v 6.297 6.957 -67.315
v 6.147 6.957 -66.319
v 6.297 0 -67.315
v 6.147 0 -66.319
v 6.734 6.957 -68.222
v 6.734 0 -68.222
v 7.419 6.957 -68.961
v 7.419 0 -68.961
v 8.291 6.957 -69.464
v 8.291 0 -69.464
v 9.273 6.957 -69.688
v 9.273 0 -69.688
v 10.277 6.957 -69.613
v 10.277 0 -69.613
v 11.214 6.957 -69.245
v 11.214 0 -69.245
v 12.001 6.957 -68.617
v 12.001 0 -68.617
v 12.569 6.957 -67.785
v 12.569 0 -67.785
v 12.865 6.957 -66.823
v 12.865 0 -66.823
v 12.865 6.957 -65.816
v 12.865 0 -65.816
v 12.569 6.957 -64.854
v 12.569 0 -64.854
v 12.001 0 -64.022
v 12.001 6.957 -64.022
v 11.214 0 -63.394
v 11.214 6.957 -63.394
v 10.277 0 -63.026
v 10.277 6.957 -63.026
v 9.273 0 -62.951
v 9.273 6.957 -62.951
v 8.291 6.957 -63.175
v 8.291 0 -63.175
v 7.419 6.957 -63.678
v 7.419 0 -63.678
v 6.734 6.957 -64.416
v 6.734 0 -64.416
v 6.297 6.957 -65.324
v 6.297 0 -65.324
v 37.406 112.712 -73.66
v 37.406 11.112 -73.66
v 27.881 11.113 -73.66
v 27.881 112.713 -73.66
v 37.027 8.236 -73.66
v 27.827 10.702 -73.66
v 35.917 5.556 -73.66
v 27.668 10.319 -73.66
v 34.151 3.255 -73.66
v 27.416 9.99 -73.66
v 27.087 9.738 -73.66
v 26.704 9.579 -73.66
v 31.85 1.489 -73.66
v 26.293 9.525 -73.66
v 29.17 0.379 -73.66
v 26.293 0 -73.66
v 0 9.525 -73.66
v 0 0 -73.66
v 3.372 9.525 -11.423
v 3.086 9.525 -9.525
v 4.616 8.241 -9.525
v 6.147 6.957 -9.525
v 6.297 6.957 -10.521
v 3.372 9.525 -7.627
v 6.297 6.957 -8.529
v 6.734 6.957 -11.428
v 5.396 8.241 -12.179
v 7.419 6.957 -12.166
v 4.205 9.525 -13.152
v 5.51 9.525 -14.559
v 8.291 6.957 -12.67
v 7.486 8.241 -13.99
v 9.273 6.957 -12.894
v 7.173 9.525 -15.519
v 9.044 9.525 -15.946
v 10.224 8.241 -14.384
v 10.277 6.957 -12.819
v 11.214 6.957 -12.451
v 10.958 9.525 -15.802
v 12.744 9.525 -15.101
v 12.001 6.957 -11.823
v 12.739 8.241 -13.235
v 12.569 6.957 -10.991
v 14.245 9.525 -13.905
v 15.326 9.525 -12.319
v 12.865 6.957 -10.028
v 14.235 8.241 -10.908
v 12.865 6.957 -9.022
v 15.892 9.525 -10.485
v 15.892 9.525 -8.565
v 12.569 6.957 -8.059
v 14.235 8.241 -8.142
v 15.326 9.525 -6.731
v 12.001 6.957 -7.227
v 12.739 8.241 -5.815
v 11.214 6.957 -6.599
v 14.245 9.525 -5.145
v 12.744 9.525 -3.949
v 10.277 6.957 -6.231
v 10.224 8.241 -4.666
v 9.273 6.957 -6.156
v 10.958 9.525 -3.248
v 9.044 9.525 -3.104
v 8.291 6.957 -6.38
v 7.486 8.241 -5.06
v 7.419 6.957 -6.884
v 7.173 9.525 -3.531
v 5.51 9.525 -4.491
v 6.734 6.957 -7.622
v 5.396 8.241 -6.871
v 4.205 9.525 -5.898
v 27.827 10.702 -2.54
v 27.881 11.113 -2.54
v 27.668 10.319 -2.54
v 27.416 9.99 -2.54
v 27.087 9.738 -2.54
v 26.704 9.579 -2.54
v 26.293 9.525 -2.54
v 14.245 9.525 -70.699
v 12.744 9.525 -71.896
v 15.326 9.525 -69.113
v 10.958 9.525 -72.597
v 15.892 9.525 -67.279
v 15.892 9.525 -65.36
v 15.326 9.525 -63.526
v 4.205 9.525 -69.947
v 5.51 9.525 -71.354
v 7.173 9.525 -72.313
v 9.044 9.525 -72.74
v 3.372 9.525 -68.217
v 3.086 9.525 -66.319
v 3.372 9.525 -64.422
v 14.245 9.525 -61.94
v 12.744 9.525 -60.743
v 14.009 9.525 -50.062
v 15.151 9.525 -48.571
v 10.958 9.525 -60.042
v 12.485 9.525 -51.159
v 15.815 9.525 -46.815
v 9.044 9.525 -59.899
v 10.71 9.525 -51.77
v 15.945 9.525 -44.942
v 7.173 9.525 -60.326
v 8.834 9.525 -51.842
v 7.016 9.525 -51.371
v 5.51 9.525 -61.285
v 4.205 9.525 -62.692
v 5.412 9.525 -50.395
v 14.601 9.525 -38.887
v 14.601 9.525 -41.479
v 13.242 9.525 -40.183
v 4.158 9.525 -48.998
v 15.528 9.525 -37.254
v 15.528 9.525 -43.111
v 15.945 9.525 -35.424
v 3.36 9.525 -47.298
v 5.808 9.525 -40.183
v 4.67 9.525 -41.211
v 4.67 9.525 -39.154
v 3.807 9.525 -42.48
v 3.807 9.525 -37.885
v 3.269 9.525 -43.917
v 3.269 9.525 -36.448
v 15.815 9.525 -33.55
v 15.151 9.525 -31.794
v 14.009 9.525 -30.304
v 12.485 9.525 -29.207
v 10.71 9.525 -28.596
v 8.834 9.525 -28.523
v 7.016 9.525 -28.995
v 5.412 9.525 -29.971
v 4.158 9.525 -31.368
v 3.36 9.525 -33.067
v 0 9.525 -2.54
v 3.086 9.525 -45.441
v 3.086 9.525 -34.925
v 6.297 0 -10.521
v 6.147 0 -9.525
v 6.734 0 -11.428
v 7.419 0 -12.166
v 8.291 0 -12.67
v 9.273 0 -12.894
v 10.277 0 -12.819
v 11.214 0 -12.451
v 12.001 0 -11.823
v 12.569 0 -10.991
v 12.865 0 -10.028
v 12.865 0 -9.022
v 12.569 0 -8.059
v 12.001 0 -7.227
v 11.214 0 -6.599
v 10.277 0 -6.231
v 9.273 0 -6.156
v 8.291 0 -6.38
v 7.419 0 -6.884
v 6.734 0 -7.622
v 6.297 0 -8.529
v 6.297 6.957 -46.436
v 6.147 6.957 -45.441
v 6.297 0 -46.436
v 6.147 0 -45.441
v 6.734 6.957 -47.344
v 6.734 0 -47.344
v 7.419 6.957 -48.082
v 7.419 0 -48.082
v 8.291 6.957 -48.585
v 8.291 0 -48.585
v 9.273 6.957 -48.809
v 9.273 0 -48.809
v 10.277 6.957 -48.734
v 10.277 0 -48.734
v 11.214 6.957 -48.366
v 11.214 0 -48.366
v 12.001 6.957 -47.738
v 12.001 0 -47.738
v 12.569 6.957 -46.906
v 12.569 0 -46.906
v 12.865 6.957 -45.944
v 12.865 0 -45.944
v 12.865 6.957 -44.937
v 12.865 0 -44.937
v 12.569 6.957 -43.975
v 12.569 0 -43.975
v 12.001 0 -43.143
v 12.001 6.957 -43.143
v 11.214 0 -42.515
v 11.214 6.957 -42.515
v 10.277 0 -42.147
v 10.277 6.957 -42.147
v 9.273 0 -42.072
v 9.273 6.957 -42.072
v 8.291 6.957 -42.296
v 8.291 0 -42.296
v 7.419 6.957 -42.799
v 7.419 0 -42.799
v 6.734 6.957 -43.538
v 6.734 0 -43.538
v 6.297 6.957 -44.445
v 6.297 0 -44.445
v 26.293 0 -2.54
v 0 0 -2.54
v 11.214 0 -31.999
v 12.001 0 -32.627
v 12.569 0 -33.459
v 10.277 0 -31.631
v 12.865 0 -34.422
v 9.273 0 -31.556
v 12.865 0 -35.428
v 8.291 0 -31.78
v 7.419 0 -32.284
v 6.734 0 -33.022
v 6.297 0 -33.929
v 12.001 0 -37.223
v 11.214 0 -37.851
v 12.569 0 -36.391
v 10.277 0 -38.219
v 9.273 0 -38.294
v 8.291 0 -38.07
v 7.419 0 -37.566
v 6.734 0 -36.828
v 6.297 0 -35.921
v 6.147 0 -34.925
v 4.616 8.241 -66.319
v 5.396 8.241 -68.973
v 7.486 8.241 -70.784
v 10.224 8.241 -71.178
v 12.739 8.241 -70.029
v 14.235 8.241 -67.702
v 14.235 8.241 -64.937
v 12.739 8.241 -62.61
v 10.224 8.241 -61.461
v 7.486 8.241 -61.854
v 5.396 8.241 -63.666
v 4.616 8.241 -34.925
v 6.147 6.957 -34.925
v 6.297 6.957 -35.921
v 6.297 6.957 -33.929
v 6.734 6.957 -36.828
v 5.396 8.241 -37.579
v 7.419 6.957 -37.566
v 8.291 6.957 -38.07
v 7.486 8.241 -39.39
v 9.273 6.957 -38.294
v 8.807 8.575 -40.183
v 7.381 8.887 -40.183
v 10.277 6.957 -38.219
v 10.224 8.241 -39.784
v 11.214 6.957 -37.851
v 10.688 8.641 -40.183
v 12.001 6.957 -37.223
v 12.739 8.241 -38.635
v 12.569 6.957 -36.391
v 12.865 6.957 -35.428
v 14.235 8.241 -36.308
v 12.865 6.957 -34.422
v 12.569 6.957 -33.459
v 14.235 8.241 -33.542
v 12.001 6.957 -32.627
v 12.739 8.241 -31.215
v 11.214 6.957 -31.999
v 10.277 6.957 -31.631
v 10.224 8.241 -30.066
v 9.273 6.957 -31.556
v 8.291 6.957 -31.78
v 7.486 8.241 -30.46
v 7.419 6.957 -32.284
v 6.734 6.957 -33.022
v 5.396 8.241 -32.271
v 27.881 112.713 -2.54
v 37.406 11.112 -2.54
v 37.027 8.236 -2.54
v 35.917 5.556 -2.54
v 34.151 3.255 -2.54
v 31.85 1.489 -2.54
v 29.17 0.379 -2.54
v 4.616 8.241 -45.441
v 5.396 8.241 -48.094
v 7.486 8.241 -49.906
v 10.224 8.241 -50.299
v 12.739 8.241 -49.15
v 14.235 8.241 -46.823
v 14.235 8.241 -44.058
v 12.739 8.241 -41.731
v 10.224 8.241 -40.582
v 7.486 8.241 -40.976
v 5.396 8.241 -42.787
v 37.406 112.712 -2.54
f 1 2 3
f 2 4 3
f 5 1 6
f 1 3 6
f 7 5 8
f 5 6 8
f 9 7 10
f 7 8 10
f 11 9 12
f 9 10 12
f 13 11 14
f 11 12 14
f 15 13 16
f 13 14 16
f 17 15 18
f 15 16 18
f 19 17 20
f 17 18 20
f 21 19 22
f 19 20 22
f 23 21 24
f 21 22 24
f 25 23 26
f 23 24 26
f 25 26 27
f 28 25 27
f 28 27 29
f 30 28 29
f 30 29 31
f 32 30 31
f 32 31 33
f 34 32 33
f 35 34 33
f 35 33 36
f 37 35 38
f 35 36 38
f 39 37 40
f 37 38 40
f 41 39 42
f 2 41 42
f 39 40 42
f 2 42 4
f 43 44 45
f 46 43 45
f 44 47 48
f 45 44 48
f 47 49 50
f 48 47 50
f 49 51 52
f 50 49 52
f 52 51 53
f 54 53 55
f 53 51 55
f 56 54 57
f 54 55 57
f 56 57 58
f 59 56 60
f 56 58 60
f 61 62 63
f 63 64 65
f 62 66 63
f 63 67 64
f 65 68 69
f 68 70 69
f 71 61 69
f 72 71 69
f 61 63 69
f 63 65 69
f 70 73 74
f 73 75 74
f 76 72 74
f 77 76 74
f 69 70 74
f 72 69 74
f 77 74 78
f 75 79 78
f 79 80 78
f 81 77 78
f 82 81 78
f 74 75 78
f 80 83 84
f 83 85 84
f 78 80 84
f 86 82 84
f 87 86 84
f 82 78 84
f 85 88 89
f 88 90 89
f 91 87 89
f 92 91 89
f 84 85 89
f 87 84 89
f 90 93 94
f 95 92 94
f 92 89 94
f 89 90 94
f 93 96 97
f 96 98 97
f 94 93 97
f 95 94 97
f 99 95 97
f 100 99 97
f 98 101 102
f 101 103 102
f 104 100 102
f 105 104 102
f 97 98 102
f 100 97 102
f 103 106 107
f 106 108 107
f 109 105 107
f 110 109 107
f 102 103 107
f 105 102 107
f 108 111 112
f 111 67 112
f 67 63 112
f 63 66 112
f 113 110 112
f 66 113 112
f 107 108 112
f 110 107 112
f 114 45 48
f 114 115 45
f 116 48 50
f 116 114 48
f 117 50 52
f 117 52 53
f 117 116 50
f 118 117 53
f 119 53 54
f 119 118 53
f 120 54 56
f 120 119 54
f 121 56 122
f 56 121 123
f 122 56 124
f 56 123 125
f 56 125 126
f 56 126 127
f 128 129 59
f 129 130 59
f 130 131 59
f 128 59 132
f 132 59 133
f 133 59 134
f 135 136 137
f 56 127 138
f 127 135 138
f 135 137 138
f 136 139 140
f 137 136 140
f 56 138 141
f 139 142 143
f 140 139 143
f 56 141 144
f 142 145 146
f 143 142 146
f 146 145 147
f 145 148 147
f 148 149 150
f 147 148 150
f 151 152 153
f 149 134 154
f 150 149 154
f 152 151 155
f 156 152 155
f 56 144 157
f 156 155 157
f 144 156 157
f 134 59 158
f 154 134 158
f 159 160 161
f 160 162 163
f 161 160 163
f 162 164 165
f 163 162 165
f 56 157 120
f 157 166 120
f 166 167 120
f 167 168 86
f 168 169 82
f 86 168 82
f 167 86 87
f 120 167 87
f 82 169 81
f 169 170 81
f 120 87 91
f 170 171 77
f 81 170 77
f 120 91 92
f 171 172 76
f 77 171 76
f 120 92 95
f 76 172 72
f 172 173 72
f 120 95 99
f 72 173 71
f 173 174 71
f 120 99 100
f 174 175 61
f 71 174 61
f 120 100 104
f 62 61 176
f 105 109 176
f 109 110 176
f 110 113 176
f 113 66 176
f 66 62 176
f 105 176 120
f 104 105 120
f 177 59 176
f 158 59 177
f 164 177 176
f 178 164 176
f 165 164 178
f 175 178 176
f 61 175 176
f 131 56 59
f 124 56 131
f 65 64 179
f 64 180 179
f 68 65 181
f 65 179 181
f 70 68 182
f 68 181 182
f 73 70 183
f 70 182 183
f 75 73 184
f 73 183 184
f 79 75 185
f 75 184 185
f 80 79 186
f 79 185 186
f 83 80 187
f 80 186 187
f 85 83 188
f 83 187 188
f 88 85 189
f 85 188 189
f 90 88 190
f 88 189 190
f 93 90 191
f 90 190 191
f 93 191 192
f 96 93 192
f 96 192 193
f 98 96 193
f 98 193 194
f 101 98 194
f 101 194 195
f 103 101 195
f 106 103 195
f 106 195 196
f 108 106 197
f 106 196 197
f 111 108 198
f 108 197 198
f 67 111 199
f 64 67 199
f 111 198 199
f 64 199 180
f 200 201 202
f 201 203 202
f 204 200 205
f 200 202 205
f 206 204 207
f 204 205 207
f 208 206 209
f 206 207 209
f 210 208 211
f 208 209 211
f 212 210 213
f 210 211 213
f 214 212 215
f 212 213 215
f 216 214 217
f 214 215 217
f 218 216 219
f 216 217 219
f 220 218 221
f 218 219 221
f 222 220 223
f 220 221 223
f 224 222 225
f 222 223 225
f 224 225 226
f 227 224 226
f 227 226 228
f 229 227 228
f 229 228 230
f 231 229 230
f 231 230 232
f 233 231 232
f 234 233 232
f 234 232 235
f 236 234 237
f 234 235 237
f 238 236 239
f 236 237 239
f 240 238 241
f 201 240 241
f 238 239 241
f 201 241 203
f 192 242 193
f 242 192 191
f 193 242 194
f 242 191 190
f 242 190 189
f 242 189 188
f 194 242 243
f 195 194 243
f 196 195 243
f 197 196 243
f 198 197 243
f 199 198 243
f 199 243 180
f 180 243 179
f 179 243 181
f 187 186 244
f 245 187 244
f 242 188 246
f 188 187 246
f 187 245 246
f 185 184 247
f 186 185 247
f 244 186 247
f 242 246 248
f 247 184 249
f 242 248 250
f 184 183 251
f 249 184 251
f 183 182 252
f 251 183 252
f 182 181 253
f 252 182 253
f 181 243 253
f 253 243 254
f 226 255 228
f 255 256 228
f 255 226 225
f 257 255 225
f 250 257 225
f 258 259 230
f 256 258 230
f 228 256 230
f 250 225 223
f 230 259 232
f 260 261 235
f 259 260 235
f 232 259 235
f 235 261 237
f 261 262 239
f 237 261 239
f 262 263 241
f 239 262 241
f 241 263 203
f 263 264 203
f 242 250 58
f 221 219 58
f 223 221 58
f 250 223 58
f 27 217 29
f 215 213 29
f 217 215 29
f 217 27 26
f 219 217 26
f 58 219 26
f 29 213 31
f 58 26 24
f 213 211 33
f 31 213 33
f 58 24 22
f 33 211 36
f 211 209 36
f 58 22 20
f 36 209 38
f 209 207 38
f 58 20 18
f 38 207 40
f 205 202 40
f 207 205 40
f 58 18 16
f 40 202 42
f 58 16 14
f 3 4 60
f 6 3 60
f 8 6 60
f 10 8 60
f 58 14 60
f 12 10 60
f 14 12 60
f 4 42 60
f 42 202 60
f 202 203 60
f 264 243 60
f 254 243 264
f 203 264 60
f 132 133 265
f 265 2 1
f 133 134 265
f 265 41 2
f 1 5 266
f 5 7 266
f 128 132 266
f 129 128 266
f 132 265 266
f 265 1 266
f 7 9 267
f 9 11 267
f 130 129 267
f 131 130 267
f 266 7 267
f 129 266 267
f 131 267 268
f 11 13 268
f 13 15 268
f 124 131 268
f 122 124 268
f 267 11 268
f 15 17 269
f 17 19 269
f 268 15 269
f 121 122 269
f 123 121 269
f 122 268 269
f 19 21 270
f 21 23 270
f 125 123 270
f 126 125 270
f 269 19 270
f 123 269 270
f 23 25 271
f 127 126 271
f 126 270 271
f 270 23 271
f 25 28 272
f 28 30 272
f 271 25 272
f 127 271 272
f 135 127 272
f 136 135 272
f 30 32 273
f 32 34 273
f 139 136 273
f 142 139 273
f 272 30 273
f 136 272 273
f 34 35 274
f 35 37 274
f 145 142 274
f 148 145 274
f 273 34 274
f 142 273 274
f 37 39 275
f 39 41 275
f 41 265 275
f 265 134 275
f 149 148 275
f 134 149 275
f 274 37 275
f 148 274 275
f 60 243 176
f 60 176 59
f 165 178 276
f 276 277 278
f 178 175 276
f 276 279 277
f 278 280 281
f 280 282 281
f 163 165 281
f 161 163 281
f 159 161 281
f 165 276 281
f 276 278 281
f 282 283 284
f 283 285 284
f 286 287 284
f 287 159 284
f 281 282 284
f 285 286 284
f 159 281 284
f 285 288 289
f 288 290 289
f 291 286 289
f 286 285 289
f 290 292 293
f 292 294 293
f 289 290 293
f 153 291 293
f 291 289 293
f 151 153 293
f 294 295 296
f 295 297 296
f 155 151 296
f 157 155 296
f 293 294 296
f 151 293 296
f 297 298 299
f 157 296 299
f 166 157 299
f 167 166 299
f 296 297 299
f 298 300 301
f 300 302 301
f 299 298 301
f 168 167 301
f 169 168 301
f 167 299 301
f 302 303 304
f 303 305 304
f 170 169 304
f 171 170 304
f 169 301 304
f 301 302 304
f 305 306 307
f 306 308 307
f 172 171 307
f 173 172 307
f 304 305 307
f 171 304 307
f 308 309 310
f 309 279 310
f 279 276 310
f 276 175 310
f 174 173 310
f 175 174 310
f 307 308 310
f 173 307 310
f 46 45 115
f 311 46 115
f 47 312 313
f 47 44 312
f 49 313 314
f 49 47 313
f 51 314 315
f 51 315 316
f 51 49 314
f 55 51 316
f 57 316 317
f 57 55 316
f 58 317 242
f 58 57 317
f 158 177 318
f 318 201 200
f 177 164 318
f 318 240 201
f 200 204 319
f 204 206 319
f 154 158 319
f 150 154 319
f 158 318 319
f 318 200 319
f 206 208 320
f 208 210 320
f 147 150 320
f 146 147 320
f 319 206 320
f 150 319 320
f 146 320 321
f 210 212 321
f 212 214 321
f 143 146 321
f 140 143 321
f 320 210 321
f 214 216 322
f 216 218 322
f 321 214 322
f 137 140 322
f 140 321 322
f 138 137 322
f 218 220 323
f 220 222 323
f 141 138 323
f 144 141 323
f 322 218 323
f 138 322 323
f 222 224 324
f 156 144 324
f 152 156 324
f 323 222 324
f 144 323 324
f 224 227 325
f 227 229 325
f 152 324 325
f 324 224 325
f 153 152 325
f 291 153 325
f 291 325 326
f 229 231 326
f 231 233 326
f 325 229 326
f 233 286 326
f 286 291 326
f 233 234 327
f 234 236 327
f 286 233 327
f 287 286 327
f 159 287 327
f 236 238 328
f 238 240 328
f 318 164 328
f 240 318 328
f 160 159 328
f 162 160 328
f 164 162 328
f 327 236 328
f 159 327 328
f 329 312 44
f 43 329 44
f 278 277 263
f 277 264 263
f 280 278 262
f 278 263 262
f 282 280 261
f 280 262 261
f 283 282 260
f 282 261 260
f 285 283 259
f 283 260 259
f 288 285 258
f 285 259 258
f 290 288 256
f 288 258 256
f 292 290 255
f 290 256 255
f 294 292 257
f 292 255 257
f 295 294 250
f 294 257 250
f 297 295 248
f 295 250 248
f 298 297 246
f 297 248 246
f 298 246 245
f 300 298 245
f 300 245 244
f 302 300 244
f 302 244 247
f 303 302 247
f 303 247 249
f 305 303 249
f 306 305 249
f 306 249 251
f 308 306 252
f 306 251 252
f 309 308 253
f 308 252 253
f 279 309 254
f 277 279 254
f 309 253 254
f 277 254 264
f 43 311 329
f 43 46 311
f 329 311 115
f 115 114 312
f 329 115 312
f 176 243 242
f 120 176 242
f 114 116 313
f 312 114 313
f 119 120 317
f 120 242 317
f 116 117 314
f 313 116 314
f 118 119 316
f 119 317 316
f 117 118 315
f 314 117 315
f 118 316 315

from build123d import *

# Parameters (mm, degrees)
SKETCH1_W                                           = 25.4
SKETCH1_H                                           = 71.12
BOSS_EXTRUDE1_DEPTH                                 = 9.525
CSK_FOR_1_4_FLAT_HEAD_MACHINE_SCREW_100_D           = 6.7564
CSK_FOR_1_4_FLAT_HEAD_MACHINE_SCREW_100_CSINK_D     = 12.8778
CSK_FOR_1_4_FLAT_HEAD_MACHINE_SCREW_100_CSINK_ANGLE = 100
SKETCH6_W                                           = 71.12
SKETCH6_H                                           = 9.525


with BuildPart() as part:
    # Sketch1 → Boss-Extrude1 (new body)
    with BuildSketch(Plane(origin=(0, 0, 0), x_dir=(1, 0, 0), z_dir=(0, 1, 0))):
        with Locations((12.7, 38.1)):
            Rectangle(SKETCH1_W, SKETCH1_H)
    extrude(amount=BOSS_EXTRUDE1_DEPTH)

    # CSK for 1/4 Flat Head Machine Screw (100)1 (through all)
    with Locations(Plane(origin=(0, 9.525, 0), x_dir=(1, 0, 0), z_dir=(0, 1, 0))):
        with Locations((9.525, 9.525), (9.525, 34.925), (9.525, 45.4406), (9.525, 66.3194)):
            CounterSinkHole(CSK_FOR_1_4_FLAT_HEAD_MACHINE_SCREW_100_D / 2, CSK_FOR_1_4_FLAT_HEAD_MACHINE_SCREW_100_CSINK_D / 2, counter_sink_angle=CSK_FOR_1_4_FLAT_HEAD_MACHINE_SCREW_100_CSINK_ANGLE)

    # Sweep1: sweep along a path in Sketch4
    with BuildLine(Plane(origin=(0, 0, -73.66), x_dir=(-1, 0, 0), z_dir=(0, 0, -1))) as sweep1_path:
        Line((-32.643415346, 112.7125), (-32.643415346, 11.1125))
        ThreePointArc((-32.643415346, 11.1125), (-30.783543406, 6.622371939), (-26.293415346, 4.7625))
        Line((-26.293415346, 4.7625), (-25.4, 4.7625))
    # Sketch6 → Sweep1 (sweep)
    with BuildSketch(Plane(origin=(25.4, 0, 0), x_dir=(0, 0, -1), z_dir=(1, 0, 0))):
        with Locations((38.1, 4.7625)):
            Rectangle(SKETCH6_W, SKETCH6_H)
    sweep(path=sweep1_path.line)


solid = part.part
